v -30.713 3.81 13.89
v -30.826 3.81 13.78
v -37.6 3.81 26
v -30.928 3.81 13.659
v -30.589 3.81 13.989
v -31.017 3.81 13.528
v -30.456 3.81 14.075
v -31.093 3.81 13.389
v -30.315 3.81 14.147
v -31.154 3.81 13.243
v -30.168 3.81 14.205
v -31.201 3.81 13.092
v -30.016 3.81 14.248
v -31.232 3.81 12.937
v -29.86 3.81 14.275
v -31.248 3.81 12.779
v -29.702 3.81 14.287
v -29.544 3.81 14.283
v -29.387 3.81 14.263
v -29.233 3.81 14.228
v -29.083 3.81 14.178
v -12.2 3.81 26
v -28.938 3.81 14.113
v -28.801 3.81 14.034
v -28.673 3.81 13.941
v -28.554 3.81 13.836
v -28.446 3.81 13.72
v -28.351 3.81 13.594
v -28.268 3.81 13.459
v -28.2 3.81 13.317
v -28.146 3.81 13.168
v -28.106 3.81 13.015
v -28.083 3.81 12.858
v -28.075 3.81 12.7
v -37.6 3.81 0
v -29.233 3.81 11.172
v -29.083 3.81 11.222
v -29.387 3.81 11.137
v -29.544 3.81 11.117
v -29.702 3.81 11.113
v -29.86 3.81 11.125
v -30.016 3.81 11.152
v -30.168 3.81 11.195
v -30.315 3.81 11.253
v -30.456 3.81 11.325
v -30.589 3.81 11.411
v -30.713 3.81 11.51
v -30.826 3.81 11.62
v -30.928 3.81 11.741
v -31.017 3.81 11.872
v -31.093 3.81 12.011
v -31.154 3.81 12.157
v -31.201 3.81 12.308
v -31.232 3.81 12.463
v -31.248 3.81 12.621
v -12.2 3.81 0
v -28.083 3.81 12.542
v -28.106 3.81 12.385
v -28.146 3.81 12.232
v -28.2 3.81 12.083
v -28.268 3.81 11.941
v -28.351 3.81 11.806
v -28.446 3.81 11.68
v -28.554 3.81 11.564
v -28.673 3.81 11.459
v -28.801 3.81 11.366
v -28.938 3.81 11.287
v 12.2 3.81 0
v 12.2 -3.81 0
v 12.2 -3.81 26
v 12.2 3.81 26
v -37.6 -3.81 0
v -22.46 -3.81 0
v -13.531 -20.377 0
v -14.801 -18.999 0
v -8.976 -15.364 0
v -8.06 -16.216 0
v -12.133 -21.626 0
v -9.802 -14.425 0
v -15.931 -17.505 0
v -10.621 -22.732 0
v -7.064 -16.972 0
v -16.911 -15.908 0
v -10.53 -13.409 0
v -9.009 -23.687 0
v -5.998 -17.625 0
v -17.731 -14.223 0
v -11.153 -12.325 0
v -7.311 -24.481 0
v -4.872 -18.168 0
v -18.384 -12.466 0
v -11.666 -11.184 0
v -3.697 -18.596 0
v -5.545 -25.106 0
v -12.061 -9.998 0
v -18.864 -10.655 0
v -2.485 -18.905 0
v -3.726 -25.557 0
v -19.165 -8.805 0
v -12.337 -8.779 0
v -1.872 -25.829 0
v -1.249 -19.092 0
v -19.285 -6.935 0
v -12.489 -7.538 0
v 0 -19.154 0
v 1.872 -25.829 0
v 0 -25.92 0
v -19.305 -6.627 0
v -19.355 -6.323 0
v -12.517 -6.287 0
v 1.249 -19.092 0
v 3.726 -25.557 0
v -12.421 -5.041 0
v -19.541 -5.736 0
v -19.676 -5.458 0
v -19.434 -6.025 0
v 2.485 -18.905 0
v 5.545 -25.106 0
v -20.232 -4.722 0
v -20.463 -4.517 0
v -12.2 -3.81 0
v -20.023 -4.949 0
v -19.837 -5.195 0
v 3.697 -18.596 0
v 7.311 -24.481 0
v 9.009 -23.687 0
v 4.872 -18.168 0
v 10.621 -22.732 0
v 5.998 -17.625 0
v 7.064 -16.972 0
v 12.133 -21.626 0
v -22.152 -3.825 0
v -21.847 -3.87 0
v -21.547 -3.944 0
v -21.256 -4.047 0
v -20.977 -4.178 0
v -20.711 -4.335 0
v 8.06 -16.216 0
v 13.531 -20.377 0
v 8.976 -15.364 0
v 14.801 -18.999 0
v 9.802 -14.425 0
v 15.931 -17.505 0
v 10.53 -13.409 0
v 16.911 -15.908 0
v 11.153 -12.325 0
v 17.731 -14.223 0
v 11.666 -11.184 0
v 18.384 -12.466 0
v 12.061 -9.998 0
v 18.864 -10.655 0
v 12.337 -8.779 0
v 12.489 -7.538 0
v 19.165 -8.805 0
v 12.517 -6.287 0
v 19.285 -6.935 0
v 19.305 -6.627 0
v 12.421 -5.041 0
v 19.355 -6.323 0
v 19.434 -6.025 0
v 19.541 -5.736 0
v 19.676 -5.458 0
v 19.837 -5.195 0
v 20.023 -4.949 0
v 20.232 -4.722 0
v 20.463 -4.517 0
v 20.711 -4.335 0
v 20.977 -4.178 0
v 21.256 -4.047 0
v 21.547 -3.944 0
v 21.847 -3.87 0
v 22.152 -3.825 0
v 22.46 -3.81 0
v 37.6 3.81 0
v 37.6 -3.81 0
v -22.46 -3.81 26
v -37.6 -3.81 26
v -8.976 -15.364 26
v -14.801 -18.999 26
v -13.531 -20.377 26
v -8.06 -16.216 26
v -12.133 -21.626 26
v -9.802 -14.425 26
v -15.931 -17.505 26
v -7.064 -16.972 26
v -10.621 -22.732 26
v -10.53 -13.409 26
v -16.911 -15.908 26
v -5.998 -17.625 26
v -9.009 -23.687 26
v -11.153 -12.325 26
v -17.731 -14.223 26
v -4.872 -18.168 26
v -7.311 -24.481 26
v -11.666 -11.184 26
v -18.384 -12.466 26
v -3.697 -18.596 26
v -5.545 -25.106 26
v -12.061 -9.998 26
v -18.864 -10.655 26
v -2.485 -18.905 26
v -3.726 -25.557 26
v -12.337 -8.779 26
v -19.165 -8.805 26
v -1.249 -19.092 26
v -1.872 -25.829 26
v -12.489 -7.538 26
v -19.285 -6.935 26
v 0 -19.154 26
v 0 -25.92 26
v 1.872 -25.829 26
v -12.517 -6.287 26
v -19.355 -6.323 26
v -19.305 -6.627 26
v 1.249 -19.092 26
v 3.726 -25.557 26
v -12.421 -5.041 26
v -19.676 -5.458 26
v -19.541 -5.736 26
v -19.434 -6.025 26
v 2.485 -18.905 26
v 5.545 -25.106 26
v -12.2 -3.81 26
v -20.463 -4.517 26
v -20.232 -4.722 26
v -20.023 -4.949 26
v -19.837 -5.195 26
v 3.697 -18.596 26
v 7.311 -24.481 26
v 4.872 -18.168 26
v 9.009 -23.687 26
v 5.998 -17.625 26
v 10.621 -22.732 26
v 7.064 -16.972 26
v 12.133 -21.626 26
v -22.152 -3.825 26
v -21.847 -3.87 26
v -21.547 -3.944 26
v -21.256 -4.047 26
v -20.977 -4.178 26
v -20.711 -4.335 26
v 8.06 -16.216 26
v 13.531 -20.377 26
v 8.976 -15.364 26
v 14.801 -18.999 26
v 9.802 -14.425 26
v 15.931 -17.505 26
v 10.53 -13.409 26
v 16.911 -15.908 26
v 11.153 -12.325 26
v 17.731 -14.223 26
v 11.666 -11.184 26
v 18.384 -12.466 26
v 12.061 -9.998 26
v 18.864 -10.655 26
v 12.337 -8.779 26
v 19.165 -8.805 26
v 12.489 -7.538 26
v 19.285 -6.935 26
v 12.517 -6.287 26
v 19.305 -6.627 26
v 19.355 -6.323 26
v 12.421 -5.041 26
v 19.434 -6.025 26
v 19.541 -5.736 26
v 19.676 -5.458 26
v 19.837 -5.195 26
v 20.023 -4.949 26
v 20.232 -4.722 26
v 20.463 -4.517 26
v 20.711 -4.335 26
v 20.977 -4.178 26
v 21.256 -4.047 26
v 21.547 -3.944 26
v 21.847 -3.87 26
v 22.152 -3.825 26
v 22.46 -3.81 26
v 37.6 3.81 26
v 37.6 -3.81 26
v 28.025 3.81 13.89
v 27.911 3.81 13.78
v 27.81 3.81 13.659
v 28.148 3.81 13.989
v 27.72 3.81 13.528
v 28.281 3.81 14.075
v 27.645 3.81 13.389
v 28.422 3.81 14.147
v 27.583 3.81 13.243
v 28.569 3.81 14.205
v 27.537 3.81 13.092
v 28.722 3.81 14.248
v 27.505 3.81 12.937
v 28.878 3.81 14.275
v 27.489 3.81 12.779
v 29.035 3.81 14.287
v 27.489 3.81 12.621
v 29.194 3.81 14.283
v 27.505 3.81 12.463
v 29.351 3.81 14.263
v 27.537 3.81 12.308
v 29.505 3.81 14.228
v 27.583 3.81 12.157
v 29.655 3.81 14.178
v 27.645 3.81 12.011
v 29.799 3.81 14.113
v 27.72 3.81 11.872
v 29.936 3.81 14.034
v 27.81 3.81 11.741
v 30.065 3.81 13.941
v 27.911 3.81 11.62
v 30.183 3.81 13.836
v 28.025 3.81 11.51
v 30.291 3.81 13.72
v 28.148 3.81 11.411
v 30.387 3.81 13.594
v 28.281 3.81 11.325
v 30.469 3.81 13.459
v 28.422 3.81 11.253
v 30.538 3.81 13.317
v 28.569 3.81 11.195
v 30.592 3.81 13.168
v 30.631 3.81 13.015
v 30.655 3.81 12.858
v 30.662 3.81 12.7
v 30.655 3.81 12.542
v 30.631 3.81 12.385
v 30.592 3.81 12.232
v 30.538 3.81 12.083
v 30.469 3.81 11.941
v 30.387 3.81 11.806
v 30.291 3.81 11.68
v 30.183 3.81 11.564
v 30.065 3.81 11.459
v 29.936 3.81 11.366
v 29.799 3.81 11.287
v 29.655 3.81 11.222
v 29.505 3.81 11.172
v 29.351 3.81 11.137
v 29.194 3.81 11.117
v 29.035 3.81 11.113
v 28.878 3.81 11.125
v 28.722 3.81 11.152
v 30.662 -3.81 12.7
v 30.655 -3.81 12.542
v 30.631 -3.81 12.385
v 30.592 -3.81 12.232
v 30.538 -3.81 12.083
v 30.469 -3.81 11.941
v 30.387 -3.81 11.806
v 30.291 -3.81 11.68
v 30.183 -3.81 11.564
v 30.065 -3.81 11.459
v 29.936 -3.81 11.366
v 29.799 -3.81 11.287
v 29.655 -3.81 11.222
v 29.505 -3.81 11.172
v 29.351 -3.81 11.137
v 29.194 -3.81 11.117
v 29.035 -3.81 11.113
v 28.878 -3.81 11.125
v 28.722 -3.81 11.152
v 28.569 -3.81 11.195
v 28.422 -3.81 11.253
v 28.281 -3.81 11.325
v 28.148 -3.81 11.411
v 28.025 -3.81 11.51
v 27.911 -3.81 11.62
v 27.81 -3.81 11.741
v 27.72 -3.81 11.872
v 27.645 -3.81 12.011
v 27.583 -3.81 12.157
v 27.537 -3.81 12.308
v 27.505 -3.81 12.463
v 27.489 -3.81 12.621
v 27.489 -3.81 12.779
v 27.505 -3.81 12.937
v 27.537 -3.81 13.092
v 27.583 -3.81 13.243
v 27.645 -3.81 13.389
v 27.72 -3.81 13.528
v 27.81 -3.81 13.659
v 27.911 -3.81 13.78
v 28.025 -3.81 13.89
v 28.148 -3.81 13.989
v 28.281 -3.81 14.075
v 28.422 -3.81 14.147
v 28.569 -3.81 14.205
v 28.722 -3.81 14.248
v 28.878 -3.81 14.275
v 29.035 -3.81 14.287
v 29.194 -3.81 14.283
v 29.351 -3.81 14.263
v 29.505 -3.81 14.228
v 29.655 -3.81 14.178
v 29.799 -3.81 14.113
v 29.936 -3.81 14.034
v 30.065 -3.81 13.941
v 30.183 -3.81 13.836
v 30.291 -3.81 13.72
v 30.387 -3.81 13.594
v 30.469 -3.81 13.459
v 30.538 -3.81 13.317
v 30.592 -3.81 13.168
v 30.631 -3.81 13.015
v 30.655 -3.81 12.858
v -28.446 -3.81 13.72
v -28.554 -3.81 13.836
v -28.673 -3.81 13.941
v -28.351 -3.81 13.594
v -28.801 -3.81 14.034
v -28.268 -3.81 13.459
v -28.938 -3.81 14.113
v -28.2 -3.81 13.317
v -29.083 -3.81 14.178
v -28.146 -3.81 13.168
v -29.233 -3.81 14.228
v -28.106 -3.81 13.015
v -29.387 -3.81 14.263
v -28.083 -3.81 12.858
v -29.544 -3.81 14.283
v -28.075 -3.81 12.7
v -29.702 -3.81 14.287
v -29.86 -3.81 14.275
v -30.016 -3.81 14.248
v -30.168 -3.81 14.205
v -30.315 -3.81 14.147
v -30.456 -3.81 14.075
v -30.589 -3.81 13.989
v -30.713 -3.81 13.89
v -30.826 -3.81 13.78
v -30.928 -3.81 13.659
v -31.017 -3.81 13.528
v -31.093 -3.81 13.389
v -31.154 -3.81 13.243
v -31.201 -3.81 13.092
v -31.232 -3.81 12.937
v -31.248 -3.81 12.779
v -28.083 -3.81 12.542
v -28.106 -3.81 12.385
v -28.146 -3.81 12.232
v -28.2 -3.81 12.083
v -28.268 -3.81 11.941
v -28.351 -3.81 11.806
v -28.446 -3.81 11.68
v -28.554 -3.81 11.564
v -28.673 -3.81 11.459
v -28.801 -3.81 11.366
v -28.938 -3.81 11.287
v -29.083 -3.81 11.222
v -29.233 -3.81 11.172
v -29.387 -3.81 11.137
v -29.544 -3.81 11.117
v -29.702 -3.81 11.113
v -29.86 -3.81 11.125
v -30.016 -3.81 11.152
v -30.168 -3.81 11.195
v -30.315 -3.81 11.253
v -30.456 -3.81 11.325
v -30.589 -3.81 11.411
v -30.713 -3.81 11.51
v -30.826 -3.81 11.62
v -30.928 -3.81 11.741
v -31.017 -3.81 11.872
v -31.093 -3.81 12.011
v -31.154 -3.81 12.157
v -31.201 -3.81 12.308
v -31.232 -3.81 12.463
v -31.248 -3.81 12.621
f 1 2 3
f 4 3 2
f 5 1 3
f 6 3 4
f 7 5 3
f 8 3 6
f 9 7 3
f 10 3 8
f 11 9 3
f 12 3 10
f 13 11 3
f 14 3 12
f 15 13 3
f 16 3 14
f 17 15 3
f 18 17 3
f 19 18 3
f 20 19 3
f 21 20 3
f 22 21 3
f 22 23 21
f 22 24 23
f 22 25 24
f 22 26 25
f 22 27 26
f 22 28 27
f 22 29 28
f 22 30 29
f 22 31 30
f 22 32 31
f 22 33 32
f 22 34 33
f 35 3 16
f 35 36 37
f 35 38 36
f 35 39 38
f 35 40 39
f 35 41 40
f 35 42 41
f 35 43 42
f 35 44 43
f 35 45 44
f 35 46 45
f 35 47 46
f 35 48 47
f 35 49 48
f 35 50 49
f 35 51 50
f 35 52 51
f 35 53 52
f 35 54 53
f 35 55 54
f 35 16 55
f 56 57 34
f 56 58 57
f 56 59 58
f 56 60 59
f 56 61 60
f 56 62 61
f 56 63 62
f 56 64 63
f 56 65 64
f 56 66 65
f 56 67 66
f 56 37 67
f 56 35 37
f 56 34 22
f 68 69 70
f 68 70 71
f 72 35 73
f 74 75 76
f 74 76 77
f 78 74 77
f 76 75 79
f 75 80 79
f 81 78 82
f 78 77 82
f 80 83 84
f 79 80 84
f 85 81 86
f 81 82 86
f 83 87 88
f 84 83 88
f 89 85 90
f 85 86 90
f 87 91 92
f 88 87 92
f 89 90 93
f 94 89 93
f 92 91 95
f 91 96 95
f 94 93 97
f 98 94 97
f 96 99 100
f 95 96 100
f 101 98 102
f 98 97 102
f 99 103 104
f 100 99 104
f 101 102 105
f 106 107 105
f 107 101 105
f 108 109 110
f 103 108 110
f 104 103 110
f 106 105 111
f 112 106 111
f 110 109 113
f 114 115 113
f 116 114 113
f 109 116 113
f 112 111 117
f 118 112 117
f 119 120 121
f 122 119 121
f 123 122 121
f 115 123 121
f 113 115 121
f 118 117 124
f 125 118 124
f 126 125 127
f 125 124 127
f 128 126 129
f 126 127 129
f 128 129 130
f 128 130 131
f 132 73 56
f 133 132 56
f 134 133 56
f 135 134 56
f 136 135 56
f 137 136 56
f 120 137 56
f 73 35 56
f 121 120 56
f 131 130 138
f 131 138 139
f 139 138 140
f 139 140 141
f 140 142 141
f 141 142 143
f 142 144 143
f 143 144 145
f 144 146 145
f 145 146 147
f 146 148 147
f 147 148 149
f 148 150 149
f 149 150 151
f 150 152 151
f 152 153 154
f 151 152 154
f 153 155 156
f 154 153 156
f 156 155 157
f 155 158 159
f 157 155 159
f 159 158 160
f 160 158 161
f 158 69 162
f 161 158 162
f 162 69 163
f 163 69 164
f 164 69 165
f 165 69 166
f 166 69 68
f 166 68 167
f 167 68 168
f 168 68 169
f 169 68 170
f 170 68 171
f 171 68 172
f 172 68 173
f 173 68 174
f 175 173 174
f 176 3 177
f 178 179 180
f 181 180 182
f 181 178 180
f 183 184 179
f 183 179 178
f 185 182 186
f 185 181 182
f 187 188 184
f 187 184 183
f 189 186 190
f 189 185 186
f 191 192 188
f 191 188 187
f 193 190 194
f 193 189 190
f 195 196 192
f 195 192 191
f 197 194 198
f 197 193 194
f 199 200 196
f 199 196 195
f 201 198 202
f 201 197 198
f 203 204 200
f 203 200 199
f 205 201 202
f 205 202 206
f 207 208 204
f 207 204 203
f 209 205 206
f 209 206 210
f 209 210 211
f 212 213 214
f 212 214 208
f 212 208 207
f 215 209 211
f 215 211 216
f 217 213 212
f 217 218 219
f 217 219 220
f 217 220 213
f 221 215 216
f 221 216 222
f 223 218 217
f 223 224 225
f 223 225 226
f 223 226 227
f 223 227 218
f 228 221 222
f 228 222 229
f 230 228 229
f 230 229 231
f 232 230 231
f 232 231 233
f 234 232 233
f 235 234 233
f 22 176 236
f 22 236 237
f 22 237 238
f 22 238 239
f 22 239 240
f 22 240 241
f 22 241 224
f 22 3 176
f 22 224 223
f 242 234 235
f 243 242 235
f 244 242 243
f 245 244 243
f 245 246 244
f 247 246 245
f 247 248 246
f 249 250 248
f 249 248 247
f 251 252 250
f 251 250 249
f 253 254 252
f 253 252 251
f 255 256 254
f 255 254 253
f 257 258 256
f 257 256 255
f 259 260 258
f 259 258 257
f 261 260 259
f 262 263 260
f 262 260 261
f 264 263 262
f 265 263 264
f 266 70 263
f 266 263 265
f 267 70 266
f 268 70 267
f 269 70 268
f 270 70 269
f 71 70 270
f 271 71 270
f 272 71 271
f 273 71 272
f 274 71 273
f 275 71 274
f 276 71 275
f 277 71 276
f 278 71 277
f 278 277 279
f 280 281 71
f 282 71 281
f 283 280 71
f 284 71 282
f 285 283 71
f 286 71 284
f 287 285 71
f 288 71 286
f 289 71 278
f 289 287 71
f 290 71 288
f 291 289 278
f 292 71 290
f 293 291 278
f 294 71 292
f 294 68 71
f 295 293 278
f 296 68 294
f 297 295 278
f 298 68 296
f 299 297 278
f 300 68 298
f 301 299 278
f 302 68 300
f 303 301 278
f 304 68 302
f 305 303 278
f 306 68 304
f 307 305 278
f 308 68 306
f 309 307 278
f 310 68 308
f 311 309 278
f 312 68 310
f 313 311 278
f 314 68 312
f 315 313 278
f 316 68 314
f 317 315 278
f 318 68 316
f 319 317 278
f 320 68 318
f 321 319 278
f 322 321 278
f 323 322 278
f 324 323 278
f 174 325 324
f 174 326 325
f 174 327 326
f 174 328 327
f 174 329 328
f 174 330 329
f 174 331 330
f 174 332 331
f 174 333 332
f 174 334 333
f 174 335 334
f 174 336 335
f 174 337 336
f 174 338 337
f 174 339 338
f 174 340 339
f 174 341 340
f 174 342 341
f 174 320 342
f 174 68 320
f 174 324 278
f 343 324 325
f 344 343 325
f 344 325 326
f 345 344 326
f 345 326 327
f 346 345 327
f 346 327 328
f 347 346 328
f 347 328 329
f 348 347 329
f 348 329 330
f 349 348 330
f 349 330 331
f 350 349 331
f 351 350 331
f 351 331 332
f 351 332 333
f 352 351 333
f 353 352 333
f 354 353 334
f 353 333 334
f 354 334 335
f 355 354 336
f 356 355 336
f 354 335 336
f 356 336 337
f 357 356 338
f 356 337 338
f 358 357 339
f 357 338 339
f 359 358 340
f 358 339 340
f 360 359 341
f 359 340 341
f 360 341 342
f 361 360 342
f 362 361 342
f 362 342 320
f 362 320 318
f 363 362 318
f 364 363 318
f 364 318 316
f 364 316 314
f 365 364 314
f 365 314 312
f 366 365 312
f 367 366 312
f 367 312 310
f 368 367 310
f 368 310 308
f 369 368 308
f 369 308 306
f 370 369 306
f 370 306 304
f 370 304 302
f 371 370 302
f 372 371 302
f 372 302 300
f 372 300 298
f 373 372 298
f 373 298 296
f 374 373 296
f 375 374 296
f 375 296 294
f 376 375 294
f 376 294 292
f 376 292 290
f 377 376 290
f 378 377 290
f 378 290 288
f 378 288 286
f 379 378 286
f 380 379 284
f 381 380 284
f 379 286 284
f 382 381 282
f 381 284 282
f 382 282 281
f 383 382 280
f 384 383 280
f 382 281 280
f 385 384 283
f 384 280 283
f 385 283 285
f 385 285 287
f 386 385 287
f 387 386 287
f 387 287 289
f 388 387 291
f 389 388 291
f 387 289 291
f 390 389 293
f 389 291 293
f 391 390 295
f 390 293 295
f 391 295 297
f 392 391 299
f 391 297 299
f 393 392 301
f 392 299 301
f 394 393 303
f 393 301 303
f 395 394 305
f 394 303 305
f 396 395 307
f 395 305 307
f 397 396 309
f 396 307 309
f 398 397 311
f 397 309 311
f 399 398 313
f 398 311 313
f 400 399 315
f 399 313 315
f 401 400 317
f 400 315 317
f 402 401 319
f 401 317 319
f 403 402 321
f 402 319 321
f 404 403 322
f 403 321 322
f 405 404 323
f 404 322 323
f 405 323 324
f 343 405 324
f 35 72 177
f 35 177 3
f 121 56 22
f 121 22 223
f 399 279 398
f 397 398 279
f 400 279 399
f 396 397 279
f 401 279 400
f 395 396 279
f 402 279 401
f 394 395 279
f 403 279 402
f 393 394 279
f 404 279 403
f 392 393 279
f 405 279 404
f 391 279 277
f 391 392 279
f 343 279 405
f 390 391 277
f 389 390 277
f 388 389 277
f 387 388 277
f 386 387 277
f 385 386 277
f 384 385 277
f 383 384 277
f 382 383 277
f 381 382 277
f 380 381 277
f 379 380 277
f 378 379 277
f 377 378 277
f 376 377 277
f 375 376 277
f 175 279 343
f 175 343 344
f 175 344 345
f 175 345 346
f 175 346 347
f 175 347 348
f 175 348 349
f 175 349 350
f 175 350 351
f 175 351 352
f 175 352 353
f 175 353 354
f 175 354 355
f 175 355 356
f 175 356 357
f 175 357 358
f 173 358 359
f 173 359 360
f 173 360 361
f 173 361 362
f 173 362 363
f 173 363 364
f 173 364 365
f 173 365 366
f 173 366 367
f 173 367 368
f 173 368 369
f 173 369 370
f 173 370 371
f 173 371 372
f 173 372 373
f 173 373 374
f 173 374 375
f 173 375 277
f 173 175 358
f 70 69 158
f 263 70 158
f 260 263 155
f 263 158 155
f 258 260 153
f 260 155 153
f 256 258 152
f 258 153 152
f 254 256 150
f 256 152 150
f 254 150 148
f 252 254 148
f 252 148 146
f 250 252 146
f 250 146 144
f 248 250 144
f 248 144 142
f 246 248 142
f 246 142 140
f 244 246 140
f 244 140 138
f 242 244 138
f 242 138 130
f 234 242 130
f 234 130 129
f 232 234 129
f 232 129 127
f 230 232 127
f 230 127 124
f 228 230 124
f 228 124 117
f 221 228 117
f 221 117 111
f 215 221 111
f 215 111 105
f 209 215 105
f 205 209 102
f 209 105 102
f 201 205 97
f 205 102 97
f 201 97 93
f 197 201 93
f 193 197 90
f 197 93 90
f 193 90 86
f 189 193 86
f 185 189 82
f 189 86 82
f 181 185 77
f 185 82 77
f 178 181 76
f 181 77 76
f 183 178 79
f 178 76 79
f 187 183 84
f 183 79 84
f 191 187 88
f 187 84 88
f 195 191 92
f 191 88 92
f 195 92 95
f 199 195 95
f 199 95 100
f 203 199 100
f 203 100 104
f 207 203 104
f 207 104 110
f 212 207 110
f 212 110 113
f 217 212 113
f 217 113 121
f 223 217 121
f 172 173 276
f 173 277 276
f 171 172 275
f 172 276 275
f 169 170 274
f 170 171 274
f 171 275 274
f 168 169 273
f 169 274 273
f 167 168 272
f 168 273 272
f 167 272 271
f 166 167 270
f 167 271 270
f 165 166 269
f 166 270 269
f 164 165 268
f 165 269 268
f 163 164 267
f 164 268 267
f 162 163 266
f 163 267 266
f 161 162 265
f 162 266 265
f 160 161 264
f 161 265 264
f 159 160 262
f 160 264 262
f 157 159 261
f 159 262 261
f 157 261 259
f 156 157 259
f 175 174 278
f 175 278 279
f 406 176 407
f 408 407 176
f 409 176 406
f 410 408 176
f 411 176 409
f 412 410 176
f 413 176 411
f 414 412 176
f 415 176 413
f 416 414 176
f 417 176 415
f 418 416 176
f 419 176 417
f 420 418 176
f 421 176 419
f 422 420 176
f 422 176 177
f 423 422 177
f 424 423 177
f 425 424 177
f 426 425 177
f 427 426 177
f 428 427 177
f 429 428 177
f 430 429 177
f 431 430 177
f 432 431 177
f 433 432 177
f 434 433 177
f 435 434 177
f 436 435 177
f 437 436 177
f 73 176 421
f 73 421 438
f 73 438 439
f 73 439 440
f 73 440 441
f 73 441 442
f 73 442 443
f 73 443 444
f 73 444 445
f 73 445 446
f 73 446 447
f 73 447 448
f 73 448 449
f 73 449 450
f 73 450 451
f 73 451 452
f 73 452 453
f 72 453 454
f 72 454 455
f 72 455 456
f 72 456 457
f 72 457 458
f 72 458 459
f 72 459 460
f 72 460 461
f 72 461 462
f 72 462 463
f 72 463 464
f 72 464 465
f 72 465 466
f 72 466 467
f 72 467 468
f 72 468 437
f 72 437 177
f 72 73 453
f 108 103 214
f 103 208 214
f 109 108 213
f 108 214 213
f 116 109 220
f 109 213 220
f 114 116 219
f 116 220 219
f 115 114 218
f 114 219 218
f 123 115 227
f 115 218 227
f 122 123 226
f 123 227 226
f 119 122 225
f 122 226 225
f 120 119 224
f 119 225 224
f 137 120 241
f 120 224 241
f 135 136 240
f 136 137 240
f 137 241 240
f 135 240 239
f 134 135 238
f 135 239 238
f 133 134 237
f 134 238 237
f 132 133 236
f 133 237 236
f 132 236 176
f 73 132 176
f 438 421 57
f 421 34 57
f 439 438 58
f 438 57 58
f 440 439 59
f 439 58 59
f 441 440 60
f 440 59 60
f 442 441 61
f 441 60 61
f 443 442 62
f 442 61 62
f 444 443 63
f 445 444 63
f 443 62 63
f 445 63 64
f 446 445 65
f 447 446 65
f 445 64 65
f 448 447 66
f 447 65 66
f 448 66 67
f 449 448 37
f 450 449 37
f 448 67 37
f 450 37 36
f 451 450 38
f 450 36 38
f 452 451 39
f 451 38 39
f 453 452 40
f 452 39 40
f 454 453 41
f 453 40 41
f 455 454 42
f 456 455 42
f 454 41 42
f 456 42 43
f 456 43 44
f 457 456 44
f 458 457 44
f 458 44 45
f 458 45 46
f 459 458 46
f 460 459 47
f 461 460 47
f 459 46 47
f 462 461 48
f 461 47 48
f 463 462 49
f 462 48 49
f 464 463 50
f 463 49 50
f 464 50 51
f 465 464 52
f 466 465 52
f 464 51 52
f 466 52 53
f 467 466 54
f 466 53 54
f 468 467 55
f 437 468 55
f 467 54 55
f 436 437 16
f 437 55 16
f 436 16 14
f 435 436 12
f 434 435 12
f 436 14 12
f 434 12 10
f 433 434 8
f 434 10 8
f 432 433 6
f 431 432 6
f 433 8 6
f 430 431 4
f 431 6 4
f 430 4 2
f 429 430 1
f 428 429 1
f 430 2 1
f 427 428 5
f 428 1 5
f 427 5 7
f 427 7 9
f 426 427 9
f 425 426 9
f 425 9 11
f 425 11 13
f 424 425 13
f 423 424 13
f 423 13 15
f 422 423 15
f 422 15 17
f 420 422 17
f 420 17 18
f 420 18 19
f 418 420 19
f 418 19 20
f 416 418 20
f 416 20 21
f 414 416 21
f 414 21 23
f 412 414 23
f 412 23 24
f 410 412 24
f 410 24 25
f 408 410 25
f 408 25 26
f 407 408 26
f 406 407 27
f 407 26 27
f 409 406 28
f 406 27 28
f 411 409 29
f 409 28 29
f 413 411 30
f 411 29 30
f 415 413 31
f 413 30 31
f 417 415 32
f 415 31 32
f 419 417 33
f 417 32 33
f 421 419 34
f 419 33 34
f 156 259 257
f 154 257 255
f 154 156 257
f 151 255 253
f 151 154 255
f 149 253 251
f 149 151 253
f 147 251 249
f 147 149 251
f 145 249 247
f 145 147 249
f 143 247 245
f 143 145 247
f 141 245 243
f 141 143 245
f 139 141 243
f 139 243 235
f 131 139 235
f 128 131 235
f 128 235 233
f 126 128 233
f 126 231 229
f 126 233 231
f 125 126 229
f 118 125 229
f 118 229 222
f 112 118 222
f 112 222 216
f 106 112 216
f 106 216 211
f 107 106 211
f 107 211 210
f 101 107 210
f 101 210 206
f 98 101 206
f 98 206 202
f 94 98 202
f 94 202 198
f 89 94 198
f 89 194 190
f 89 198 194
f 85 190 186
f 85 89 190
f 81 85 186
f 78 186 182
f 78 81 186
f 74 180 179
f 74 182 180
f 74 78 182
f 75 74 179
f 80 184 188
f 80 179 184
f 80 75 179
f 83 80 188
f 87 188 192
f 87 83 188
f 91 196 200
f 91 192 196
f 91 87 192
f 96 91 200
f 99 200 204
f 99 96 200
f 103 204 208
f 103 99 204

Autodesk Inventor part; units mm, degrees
ref_plane "YZ Plane" through (0, 0, 0) normal (1, 0, 0) x (0, 1, 0)
ref_plane "XZ Plane" through (0, 0, 0) normal (0, 1, 0) x (-1, 0, 0)
ref_plane "XY Plane" through (0, 0, 0) normal (0, 0, 1) x (1, 0, 0)
sketch "Sketch1" plane through (0, 0, 0) normal (0, 0, 1) x (1, 0, 0)
  line L0 (-37.6, 3.81) -> (-12.2, 3.81)
  line L1 (-12.2, 3.81) -> (-12.2, -3.81)
  line L2 (-12.2, -3.81) -> (-37.6, -3.81)
  line L3 (-37.6, -3.81) -> (-37.6, 3.81)
  line L4 (-52.64, 0) -> (52.64, 0) projected
  line L5 (0, -32.0572) -> (0, 10.9036) projected
  line L6 (12.2, 3.81) -> (37.6, 3.81)
  line L7 (37.6, 3.81) -> (37.6, -3.81)
  line L8 (37.6, -3.81) -> (12.2, -3.81)
  line L9 (12.2, -3.81) -> (12.2, 3.81)
  line L10 (-9.3568, 0) -> (3.5049, 0)
  arc A0 (-12.2, -3.81) -> (12.2, -3.81) centre (0, -6.6323) ccw
  arc A1 (-19.08, -3.81) -> (19.08, -3.81) centre (0, -6.6323) ccw
  point P0 (0, 0)
  dimension "d0" = 7.62
  dimension "d2" = 7.62
  dimension "d19" = 25.4
  dimension "d20" = 25.4
  dimension "d31" = 24.4
  dimension "d32" = 12.5222
extrude "Extrusion3" add sketch "Sketch1" along normal blind 26 contours L0 L1 L4 L3 | L4 L1 L2 L3 | L9 L4 L7 L8 | L9 L6 L7 L4
extrude "Extrusion6" add sketch "Sketch1" along normal blind 26 contours A0 L5 A1 L2 | A0 L8 A1 L5
sketch "Sketch5" plane through (-37.6, 3.81, 0) normal (0, 1, 0) x (1, 0, 0)
  circle A0 centre (7.9375, -12.7) radius 1.5875
  circle A1 centre (66.675, -12.7) radius 1.5875
  point P0 (37.6, 0)
extrude "Extrusion8" cut sketch "Sketch5" against normal blind 10.16
sketch "Sketch6" plane through (0, 0, 0) normal (0, 0, -1) x (-1, 0, 0)
  circle A0 centre (0.0788, -7.3494) radius 12.1158
  dimension "d33" = 24.2316
fillet "Fillet4" radius 3.175 2 edges at (-19.08, -3.81, 13) (19.08, -3.81, 13)
equation "\"d2\" = d0"
properties part number "motor mounts"
